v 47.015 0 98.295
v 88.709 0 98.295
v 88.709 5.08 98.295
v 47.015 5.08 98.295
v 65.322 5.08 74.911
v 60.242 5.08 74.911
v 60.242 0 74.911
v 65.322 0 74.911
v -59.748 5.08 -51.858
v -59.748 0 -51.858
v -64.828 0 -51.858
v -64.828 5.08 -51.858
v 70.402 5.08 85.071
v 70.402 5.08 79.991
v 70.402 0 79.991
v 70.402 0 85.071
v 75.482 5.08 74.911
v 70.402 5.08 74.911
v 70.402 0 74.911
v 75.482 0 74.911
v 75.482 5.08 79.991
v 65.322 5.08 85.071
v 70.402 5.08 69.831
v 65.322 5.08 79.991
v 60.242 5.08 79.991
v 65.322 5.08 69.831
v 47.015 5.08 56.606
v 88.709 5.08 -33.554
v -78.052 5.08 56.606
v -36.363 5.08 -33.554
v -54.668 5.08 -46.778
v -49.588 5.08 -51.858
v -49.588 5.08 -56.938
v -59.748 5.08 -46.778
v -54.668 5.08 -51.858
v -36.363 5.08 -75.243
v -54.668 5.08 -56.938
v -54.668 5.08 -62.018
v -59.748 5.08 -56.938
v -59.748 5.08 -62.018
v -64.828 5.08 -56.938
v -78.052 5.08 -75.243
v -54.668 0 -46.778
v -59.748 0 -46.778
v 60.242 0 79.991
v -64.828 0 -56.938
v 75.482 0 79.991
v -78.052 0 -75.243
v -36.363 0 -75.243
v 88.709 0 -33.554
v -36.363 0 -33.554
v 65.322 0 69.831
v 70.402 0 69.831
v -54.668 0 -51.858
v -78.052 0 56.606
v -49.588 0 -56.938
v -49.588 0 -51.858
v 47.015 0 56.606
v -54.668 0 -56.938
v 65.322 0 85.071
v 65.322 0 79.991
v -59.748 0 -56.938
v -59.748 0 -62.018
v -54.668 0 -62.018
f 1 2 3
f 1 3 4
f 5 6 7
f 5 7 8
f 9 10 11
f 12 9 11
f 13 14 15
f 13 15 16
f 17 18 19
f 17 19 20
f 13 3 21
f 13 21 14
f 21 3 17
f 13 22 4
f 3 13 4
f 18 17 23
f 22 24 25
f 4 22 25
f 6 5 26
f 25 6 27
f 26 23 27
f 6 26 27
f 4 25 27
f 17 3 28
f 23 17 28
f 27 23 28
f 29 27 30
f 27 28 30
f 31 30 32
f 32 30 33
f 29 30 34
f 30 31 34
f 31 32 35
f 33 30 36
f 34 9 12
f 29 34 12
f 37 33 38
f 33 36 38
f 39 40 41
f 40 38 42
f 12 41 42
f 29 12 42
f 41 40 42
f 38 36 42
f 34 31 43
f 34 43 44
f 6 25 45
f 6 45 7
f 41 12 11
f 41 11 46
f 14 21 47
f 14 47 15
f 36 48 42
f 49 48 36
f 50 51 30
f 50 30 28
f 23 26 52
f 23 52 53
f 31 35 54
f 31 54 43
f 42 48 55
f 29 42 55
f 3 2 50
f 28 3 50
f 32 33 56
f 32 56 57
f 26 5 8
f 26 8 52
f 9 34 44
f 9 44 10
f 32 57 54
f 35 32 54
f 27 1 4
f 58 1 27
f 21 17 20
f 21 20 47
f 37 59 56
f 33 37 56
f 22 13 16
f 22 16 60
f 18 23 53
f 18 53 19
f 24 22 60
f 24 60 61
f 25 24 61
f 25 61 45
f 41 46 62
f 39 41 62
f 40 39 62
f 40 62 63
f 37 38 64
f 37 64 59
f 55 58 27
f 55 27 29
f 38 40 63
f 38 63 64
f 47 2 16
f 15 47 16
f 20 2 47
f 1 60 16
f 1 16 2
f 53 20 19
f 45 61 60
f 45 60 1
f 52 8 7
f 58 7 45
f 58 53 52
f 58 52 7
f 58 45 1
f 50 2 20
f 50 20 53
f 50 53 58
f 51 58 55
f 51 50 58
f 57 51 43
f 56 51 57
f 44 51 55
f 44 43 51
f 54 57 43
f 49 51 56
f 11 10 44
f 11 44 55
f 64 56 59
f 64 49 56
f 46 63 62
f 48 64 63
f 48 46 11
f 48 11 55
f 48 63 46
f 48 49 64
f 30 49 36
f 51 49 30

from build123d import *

# Parameters (mm, degrees)
BOSS_EXTRUDE1_DEPTH = 5.08


with BuildPart() as part:
    # Sketch1 → Boss-Extrude1 (new body)
    with BuildSketch(Plane(origin=(0, 0, 0), x_dir=(1, 0, 0), z_dir=(0, 1, 0))):
        Polygon((-36.363267323, 33.553843074), (88.708872677, 33.553843074), (88.708872677, -56.605996926), (88.708872677, -98.295016926), (47.014772677, -98.295016926), (47.014772677, -56.605996926), (-78.052287323, -56.605996926), (-78.052287323, 33.553843074), (-78.052287323, 75.242863074), (-36.363267323, 75.242863074), align=None)
        Polygon((-57.207777323, 62.018353074), (-54.667777323, 62.018353074), (-54.667777323, 56.938353074), (-49.587777323, 56.938353074), (-49.587777323, 54.398353074), (-49.587777323, 51.858353074), (-54.667777323, 51.858353074), (-54.667777323, 46.778353074), (-57.207777323, 46.778353074), (-59.747777323, 46.778353074), (-59.747777323, 51.858353074), (-64.827777323, 51.858353074), (-64.827777323, 54.398353074), (-64.827777323, 56.938353074), (-59.747777323, 56.938353074), (-59.747777323, 62.018353074), align=None, mode=Mode.SUBTRACT)
        Polygon((60.241822677, -77.450506926), (60.241822677, -74.910506926), (65.321822677, -74.910506926), (65.321822677, -69.830506926), (67.861822677, -69.830506926), (70.401822677, -69.830506926), (70.401822677, -74.910506926), (75.481822677, -74.910506926), (75.481822677, -77.450506926), (75.481822677, -79.990506926), (70.401822677, -79.990506926), (70.401822677, -85.070506926), (67.861822677, -85.070506926), (65.321822677, -85.070506926), (65.321822677, -79.990506926), (60.241822677, -79.990506926), align=None, mode=Mode.SUBTRACT)
    extrude(amount=BOSS_EXTRUDE1_DEPTH)


solid = part.part
